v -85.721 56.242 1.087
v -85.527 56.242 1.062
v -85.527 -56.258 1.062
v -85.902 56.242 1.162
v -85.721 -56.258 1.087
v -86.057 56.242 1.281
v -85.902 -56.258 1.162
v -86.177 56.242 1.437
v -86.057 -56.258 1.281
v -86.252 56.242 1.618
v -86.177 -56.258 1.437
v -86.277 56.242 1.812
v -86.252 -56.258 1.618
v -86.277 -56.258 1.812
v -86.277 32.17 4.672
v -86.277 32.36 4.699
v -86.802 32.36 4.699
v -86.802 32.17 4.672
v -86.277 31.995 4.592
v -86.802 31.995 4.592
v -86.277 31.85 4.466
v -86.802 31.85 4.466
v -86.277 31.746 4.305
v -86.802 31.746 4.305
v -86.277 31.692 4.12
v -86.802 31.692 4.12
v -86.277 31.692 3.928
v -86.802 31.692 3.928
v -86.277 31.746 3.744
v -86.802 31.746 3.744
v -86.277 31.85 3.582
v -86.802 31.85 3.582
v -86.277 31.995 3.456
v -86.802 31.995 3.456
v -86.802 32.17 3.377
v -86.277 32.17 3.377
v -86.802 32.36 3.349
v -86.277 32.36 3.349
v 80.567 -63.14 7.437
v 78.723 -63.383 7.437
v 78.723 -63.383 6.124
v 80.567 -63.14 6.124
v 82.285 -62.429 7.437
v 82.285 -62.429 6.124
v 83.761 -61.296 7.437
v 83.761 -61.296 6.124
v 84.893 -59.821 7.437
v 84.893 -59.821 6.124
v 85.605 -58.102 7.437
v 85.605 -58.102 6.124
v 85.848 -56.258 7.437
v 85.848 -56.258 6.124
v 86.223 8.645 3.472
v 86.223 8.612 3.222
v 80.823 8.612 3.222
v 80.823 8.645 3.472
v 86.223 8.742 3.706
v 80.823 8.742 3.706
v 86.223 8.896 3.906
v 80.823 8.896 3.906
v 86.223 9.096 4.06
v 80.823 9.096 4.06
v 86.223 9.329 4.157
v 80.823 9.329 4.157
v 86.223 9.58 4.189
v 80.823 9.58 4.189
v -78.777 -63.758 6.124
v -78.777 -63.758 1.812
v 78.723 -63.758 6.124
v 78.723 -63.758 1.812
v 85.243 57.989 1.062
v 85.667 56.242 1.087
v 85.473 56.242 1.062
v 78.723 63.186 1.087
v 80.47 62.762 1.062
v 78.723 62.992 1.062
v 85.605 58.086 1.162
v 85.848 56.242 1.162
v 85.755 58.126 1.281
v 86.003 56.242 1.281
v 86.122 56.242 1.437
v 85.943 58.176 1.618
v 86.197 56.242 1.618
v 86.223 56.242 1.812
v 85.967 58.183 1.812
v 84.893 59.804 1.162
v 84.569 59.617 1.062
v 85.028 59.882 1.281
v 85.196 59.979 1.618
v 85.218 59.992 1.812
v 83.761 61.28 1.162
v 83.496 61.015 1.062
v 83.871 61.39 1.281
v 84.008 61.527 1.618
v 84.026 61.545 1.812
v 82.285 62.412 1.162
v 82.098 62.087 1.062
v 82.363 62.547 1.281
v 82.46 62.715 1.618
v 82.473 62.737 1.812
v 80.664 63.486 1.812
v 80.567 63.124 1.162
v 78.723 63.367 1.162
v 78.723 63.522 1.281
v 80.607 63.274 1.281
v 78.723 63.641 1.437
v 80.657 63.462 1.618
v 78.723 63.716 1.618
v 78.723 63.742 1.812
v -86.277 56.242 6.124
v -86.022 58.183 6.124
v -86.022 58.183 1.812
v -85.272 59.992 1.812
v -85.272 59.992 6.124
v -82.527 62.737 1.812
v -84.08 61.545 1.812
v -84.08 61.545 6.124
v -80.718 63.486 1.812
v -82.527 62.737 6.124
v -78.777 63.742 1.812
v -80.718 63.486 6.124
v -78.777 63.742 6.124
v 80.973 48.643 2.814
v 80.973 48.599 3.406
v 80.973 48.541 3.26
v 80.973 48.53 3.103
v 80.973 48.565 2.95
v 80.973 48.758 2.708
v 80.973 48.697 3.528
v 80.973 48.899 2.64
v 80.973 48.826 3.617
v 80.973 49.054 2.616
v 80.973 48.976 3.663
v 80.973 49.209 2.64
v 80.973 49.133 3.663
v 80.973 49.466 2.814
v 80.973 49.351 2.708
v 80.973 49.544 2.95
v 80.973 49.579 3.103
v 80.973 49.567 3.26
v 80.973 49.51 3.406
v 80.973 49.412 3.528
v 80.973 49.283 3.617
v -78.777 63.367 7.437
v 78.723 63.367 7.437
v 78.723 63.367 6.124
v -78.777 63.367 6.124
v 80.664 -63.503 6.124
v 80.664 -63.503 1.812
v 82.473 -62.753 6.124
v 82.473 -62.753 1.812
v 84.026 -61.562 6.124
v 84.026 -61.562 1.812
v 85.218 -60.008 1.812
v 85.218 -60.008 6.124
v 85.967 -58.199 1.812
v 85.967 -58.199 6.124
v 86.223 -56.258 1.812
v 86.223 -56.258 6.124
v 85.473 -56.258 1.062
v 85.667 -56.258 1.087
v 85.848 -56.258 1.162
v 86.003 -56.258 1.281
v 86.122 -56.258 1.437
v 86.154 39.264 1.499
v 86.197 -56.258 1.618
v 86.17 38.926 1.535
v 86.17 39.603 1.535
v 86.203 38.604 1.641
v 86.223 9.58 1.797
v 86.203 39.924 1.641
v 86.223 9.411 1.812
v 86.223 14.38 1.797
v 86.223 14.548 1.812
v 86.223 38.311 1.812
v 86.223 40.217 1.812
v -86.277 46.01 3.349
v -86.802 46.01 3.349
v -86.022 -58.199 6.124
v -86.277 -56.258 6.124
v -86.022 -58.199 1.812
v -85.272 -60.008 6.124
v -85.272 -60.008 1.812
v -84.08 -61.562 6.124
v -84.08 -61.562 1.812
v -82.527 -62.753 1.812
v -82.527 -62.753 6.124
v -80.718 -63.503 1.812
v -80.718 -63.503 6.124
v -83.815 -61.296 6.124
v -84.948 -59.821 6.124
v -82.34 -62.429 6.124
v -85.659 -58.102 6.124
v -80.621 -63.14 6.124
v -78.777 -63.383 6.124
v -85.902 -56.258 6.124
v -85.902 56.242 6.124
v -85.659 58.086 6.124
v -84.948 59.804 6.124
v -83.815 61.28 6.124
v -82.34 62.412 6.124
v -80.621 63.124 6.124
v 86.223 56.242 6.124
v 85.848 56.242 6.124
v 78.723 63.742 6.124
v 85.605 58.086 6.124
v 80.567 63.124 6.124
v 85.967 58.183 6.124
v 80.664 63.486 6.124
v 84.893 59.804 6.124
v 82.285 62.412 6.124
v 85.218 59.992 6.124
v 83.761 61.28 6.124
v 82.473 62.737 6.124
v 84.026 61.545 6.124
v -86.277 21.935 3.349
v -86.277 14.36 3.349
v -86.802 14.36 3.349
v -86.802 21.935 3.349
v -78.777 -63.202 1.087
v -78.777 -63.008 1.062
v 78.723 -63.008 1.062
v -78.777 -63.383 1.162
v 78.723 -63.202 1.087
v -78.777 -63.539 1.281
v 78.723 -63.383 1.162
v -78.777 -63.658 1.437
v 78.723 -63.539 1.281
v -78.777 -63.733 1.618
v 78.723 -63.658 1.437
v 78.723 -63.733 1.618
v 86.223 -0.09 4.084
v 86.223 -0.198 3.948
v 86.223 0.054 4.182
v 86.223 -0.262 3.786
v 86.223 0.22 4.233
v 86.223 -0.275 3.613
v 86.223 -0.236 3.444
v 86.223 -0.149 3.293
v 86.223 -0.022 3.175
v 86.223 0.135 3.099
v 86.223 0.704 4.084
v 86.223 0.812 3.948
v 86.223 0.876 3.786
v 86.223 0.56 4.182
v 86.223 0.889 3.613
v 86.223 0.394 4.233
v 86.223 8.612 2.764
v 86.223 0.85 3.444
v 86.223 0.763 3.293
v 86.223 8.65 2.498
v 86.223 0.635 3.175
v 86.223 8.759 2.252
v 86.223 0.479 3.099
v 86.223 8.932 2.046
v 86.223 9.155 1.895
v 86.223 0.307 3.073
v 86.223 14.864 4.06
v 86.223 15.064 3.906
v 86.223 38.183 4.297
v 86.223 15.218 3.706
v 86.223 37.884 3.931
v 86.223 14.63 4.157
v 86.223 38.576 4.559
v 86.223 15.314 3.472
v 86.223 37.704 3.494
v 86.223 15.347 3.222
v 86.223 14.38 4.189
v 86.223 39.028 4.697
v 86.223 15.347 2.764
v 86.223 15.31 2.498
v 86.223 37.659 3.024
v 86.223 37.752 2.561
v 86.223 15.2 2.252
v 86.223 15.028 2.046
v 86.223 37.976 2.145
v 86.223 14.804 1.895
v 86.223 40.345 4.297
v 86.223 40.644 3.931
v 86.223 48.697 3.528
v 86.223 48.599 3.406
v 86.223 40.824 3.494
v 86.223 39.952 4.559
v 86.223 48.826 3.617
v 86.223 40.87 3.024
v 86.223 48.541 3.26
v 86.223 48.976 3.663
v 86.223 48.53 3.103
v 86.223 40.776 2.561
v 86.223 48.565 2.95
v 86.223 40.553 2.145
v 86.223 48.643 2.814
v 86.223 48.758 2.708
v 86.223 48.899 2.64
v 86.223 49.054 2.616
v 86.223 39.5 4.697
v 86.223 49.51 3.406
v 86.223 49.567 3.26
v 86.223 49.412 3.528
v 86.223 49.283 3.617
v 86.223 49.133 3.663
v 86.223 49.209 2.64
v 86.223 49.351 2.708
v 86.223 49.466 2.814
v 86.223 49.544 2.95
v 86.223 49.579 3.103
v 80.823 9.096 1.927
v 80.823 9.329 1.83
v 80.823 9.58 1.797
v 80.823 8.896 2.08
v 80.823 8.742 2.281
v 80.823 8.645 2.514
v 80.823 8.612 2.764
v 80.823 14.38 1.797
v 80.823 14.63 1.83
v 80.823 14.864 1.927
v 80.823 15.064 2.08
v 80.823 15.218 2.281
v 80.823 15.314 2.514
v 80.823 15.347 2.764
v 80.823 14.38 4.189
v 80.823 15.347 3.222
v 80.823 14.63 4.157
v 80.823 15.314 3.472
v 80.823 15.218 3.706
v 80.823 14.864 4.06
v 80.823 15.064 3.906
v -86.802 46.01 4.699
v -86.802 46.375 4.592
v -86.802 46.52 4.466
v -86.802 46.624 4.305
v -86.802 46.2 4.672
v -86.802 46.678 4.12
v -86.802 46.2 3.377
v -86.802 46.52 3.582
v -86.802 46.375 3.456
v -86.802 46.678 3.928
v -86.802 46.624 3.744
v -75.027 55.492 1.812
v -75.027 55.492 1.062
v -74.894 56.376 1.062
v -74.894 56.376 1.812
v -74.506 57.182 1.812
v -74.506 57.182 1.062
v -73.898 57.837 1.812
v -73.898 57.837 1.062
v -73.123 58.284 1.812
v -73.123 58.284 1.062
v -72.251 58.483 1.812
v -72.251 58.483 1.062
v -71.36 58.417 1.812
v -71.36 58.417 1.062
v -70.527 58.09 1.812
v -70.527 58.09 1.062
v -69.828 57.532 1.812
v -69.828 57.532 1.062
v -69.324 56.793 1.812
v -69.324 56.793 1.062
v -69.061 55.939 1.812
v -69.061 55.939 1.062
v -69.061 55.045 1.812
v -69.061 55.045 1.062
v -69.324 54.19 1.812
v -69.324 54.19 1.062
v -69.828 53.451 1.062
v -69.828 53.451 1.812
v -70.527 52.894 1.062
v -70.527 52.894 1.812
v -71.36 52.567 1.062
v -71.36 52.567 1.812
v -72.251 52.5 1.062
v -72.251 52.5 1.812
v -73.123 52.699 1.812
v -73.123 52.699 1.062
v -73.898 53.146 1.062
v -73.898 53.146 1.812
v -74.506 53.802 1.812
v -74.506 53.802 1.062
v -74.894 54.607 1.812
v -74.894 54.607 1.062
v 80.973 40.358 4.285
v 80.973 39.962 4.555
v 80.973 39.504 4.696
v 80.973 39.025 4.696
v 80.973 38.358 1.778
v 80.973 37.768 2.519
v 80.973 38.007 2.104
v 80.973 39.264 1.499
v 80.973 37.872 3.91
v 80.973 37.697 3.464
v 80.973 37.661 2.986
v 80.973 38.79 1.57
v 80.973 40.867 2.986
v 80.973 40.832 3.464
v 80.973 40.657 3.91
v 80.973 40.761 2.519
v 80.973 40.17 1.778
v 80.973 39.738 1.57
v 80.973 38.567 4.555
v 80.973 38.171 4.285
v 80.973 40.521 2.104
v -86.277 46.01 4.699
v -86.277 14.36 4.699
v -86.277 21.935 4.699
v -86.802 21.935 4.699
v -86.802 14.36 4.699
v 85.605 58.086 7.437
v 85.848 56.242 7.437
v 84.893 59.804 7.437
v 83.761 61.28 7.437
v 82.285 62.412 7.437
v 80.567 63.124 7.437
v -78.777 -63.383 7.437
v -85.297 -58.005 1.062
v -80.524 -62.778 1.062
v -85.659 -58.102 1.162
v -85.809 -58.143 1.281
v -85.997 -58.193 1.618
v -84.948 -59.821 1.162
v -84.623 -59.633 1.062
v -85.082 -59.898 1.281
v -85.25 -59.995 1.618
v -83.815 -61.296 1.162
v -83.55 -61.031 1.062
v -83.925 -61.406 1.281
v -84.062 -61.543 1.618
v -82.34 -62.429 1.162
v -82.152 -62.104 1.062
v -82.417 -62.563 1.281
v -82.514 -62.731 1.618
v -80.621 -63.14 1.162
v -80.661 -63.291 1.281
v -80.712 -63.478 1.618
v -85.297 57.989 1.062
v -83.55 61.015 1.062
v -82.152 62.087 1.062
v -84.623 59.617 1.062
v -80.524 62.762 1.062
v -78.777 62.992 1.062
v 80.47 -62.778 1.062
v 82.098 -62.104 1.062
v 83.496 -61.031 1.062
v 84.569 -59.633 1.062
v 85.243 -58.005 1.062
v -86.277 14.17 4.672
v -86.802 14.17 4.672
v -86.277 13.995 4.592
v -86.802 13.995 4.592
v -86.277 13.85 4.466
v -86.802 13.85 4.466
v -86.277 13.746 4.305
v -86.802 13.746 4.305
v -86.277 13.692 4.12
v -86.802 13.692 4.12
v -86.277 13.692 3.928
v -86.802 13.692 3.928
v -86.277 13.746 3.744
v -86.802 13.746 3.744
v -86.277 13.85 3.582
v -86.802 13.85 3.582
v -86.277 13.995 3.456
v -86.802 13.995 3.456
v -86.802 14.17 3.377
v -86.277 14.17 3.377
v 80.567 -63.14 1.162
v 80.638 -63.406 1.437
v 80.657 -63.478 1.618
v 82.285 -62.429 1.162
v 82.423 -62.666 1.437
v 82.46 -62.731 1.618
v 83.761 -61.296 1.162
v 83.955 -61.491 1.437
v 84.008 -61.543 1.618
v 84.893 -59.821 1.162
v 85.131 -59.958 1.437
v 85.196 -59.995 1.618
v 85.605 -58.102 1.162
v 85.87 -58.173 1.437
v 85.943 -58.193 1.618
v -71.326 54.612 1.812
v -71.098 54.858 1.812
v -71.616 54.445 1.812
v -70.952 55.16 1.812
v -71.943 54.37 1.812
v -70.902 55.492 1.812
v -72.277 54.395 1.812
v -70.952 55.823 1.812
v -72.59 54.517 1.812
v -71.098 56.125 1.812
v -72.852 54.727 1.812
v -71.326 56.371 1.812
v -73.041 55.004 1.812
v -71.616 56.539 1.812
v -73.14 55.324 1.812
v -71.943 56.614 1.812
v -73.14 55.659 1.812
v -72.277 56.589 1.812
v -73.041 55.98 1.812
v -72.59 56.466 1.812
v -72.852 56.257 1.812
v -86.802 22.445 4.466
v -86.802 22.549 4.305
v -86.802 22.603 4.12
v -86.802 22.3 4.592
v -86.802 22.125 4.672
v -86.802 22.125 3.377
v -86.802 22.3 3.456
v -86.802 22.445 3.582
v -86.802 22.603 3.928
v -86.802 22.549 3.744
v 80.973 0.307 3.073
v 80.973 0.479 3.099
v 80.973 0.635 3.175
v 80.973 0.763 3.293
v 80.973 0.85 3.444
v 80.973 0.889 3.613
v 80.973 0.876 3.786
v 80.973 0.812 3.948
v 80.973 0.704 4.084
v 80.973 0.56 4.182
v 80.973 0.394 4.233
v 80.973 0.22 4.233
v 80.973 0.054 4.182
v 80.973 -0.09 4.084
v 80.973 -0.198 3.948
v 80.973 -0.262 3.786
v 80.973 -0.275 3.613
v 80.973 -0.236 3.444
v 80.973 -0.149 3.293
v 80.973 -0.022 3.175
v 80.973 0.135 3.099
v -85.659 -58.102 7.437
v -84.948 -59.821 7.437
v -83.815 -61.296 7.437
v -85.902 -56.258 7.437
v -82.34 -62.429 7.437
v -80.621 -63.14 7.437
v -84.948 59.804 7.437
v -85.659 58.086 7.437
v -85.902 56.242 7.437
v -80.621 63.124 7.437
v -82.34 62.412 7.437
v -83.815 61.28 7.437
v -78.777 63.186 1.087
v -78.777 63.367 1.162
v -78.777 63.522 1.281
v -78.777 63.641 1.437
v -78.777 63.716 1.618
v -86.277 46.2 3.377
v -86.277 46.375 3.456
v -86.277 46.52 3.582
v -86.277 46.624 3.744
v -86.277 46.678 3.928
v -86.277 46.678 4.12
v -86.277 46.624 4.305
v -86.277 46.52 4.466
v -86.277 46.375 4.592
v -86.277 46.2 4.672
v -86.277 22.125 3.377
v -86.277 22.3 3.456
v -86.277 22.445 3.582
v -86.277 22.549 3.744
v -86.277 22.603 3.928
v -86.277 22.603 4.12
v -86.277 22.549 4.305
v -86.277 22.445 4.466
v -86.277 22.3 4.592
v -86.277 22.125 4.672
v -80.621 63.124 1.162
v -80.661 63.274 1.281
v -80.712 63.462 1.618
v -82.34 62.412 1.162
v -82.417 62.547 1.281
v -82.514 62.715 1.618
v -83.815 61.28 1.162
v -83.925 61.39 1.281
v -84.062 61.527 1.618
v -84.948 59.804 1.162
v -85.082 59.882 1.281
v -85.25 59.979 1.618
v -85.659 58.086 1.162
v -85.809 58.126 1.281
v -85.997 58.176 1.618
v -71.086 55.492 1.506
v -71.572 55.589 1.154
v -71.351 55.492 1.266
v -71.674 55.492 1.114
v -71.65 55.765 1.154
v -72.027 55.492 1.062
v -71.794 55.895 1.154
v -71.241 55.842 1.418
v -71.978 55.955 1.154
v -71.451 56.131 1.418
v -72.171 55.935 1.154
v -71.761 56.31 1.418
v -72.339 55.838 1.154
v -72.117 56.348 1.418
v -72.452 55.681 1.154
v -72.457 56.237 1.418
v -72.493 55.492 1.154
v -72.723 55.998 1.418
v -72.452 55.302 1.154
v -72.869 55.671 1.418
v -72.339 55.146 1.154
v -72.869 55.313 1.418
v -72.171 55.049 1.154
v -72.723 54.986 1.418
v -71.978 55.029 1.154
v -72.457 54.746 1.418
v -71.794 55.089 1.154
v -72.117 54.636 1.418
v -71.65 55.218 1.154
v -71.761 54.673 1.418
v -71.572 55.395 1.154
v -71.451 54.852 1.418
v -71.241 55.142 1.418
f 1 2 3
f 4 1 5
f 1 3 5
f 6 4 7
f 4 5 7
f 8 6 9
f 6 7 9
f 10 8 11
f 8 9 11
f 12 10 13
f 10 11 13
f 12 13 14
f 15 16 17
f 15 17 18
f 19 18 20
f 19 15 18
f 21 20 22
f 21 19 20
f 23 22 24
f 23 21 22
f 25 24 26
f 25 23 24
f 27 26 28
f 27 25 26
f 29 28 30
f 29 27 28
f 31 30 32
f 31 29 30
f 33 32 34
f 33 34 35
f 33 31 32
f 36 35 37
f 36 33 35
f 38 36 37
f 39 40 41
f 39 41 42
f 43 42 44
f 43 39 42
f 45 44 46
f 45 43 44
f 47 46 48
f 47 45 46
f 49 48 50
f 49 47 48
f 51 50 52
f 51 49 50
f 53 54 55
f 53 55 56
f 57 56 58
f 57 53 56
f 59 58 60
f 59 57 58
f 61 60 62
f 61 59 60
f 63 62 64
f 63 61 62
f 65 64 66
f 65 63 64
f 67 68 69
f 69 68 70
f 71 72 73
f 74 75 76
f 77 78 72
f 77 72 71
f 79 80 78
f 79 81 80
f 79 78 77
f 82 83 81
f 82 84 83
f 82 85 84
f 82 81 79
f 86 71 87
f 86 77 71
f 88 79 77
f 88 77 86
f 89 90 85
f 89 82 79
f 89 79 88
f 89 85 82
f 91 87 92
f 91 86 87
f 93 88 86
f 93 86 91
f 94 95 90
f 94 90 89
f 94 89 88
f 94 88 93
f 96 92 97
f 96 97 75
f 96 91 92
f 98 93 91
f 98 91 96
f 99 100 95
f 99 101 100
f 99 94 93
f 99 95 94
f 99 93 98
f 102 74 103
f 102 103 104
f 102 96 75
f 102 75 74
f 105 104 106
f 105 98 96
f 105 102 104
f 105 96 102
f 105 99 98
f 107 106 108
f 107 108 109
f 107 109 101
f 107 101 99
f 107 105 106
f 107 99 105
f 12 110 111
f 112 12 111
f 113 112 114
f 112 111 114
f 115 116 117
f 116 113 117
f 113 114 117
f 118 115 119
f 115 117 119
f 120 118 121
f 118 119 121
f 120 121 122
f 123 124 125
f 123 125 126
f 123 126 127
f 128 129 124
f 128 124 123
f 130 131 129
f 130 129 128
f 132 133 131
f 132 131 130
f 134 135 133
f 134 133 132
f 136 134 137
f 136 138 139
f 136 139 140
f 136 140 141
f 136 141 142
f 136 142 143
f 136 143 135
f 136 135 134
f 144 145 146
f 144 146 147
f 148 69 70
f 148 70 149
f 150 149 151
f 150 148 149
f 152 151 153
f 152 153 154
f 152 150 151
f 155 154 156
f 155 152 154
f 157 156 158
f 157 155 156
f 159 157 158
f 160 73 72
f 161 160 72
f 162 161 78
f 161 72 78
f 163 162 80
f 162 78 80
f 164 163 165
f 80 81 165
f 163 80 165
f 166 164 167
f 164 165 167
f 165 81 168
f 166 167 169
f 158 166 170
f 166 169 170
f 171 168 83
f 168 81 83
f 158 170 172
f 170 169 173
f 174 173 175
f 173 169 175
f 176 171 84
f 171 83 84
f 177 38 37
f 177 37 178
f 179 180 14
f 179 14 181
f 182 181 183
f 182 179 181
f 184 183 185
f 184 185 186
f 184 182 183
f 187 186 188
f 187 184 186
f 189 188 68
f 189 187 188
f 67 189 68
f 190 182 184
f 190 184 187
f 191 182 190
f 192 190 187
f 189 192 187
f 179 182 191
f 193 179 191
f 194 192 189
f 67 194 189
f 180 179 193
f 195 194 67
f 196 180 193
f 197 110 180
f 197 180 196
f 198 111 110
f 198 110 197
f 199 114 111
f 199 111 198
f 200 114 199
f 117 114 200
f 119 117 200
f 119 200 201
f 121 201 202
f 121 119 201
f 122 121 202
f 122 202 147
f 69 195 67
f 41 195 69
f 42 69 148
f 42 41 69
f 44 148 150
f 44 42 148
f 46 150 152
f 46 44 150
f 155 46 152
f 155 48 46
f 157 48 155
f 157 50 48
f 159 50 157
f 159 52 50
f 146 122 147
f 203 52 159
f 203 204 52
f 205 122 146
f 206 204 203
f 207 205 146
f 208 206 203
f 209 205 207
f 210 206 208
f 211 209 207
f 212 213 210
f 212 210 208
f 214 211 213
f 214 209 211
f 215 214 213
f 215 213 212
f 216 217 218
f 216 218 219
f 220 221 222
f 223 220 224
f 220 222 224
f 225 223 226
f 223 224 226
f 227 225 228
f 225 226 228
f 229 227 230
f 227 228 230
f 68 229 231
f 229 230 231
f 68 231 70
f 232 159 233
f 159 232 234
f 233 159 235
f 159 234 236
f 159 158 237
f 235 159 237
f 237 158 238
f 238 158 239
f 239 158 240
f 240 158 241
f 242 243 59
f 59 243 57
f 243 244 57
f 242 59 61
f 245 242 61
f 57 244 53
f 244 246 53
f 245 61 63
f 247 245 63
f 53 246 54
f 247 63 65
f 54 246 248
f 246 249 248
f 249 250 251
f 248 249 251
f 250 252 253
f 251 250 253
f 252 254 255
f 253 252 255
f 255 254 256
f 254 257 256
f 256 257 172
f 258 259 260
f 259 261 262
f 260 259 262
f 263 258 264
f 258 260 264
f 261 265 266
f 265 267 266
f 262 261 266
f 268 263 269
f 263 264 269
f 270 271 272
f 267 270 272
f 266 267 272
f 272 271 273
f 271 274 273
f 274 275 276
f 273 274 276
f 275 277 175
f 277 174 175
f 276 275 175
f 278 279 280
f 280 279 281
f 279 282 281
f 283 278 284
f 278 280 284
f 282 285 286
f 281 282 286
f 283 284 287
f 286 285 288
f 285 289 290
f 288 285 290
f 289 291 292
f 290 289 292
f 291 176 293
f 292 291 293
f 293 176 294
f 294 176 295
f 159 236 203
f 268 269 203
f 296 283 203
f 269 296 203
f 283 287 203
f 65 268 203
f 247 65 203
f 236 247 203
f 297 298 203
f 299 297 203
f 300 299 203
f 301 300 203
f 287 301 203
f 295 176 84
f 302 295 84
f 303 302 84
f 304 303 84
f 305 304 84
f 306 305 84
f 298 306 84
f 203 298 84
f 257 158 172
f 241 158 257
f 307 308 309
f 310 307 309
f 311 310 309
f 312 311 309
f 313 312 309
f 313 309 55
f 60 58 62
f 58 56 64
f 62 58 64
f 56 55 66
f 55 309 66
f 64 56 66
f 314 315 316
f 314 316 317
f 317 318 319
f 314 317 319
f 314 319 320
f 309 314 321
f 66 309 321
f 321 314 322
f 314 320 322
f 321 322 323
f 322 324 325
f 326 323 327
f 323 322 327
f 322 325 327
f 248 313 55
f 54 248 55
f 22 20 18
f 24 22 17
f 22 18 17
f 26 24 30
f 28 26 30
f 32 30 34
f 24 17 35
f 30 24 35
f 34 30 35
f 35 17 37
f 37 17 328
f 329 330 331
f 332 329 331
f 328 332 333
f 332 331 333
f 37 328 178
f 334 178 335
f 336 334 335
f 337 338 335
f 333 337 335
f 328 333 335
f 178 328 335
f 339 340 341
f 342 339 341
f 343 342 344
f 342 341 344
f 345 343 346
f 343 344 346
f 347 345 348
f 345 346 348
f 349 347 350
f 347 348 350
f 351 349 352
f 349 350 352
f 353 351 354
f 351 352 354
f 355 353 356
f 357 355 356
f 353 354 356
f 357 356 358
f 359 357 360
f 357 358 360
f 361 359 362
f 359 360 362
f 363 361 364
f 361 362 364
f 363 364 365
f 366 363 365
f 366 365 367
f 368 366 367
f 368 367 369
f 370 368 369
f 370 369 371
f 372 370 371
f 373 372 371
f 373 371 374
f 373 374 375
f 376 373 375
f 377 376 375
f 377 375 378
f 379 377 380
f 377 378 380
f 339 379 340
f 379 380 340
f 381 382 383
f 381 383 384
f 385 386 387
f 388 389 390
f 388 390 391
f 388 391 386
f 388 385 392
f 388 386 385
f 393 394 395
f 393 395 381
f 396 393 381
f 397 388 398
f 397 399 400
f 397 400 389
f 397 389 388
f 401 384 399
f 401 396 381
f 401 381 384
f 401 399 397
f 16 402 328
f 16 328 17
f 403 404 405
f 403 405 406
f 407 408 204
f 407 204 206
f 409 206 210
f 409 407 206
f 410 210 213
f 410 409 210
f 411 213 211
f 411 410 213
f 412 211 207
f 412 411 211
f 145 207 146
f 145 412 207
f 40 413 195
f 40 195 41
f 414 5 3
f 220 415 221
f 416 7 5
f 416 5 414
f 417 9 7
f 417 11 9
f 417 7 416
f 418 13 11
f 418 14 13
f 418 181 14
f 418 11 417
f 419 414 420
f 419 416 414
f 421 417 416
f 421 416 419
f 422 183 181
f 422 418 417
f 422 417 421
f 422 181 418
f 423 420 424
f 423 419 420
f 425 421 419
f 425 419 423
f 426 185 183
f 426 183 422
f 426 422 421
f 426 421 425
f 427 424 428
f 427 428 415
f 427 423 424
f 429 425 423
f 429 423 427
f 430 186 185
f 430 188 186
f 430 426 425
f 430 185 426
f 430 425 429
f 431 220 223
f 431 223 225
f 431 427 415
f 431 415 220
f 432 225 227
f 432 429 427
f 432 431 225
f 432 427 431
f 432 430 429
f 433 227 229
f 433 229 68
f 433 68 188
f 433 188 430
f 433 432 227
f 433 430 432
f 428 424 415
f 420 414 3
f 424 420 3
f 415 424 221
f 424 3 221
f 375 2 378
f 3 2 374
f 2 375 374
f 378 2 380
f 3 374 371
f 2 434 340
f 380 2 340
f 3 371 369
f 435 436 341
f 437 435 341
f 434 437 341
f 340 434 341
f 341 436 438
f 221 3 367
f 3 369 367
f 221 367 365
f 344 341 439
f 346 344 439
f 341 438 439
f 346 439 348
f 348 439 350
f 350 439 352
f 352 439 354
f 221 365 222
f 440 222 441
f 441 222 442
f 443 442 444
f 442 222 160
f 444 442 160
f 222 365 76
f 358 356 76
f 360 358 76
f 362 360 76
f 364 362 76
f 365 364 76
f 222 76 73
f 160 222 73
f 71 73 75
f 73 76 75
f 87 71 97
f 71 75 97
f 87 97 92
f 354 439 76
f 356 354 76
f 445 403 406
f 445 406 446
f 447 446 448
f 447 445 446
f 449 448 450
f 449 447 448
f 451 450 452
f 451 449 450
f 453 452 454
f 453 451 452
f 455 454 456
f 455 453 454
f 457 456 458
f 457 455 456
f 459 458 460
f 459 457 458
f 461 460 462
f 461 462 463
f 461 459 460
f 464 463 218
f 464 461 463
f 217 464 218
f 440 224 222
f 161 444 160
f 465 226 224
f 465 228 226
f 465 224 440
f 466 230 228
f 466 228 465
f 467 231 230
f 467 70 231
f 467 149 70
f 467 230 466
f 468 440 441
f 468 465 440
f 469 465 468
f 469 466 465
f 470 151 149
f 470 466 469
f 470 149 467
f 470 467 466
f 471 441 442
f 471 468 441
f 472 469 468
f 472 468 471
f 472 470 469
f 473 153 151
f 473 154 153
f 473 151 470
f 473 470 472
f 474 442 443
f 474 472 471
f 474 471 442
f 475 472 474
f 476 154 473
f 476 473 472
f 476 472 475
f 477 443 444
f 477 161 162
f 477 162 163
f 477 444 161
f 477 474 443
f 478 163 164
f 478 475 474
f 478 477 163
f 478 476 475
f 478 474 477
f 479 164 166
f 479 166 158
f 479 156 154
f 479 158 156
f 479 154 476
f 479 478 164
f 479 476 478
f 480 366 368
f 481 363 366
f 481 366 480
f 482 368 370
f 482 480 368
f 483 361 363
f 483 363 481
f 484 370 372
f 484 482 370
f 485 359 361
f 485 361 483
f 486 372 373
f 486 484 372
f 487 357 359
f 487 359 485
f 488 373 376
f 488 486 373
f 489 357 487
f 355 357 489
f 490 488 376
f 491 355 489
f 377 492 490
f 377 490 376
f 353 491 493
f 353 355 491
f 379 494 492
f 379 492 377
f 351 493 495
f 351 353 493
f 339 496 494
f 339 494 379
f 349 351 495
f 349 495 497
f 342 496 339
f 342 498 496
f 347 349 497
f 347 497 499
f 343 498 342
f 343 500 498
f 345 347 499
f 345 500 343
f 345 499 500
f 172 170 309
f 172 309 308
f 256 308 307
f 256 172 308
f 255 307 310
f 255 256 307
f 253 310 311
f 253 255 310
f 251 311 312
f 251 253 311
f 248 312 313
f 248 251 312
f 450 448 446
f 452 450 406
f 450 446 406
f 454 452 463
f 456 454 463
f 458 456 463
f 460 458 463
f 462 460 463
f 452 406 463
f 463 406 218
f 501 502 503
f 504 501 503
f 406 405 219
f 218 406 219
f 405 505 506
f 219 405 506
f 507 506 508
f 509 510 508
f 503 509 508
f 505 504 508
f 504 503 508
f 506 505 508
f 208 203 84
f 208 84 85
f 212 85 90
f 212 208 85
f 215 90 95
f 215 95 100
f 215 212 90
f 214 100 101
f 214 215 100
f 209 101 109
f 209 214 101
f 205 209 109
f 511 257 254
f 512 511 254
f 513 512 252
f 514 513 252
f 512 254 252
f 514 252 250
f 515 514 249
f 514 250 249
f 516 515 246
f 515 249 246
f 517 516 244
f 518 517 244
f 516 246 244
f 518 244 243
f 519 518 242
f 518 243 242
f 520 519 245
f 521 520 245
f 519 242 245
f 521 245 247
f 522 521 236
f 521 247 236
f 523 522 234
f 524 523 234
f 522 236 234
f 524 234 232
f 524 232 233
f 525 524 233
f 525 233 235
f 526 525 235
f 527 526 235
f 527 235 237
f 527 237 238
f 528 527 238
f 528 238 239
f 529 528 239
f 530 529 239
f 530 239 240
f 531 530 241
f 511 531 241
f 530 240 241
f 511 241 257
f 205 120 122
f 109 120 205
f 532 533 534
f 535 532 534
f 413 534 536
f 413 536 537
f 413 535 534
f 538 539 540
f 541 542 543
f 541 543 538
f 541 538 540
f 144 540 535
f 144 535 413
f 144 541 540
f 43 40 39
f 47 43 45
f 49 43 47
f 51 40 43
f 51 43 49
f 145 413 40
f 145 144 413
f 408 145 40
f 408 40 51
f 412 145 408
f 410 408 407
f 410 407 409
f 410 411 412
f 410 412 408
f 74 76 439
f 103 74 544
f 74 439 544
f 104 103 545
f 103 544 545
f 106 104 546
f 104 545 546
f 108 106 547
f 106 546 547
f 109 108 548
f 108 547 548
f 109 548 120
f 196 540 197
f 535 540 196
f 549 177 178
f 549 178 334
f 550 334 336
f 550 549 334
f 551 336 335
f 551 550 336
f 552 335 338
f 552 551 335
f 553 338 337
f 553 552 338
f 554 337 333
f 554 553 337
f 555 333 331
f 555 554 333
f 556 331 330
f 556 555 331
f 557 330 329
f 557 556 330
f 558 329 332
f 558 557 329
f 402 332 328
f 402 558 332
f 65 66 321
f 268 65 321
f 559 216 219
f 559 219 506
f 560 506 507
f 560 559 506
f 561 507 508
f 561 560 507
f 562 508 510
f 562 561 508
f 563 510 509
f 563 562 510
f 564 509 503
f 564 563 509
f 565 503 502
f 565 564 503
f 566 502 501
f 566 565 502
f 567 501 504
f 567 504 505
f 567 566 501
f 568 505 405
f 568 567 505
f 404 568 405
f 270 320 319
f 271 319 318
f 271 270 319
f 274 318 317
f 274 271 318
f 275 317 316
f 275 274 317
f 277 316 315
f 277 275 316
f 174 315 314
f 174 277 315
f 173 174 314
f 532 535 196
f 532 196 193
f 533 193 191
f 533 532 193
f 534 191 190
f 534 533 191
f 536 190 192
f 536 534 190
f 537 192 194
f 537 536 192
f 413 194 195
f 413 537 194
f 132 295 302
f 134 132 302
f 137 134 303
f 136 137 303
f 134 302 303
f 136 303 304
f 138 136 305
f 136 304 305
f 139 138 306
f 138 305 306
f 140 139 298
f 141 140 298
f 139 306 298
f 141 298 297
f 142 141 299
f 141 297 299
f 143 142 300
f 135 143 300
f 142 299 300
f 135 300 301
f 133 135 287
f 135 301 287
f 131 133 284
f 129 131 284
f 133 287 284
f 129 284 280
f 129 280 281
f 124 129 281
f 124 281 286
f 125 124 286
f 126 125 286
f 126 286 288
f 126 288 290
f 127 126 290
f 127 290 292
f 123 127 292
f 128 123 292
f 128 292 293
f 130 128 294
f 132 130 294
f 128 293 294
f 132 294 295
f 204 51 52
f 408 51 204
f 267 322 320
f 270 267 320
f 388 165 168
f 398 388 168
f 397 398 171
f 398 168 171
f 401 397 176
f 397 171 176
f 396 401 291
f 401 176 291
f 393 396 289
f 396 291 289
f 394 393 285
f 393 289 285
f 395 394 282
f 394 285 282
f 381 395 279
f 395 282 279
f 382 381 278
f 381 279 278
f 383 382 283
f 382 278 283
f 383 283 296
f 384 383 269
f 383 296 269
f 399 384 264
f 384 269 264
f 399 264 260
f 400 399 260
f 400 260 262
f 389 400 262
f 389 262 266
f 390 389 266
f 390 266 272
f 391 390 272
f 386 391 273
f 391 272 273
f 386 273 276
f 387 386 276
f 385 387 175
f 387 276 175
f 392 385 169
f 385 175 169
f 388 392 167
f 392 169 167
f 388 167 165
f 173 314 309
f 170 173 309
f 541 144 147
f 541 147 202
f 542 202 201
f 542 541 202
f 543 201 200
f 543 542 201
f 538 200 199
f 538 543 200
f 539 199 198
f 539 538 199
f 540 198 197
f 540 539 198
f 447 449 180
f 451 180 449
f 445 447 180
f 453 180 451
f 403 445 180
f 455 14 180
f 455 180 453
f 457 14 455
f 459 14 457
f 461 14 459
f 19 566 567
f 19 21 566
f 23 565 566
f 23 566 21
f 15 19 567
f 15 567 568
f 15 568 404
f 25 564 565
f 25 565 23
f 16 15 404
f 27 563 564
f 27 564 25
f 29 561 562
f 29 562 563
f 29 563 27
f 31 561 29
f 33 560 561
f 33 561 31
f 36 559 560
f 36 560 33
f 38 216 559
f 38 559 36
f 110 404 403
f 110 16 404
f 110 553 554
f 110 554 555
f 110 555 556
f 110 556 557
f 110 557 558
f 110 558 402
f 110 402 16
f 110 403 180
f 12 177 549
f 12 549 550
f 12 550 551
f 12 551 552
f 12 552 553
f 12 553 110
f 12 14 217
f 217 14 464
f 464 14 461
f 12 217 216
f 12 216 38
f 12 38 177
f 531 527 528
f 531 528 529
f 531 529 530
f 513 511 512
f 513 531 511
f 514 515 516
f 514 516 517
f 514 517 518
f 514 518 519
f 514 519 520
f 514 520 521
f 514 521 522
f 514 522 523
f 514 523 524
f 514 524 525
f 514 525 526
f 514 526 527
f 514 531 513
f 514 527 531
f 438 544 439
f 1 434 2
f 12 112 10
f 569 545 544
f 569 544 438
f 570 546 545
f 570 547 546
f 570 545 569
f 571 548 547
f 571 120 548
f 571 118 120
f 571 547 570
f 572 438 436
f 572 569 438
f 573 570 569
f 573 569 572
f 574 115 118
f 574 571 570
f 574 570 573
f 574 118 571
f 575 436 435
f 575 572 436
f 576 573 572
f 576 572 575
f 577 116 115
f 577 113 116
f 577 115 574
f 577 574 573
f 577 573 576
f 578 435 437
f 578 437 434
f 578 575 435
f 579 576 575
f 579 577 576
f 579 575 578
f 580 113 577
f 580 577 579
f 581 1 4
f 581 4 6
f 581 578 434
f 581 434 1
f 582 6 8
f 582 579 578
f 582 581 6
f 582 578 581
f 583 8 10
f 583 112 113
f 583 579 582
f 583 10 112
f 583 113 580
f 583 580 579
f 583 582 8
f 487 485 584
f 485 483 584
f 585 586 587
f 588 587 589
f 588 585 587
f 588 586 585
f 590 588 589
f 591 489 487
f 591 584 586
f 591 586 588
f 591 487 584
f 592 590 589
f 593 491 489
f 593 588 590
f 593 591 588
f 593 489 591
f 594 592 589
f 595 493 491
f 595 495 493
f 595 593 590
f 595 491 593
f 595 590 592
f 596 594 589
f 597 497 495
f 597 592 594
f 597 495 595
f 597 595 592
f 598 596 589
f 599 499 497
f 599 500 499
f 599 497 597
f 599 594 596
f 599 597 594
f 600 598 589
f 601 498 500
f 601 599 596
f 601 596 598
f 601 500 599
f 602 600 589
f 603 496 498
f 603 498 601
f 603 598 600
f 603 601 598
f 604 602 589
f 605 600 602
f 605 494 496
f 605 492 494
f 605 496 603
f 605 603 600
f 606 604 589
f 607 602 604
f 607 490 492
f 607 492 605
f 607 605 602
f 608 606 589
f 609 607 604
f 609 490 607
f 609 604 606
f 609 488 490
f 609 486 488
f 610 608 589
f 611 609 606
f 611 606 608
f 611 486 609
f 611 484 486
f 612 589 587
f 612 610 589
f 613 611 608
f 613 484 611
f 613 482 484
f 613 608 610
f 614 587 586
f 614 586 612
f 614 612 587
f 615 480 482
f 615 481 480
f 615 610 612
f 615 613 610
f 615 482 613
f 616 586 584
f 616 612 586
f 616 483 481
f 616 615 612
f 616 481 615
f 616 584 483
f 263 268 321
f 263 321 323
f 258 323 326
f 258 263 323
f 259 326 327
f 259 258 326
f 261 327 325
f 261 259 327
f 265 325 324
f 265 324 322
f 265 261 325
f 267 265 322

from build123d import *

# Parameters (mm, degrees)
SKETCH1_W           = 230
SKETCH1_H           = 170
BOSS_EXTRUDE1_DEPTH = 8.5
FILLET1_R           = 10
FILLET2_R           = 1
CUT_EXTRUDE1_DEPTH  = 7.2
SKETCH9_R           = 2.143665007
SKETCH9_R_2         = 0.701539988
SKETCH9_R_3         = 0.777758638
CUT_EXTRUDE2_DEPTH  = 7
CUT_EXTRUDE3_DEPTH  = 1.75
BOSS_EXTRUDE2_DEPTH = 0.7
SKETCH16_R          = 4
CUT_EXTRUDE4_DEPTH  = 1
SCALE2_SCALE        = 0.75


# Read off the part's stored shape, not the designer's step: Dome1
with BuildPart() as part:
    # Sketch1 → Boss-Extrude1 (new body)
    with BuildSketch(Plane.XY):
        Rectangle(SKETCH1_W, SKETCH1_H)
    extrude(amount=BOSS_EXTRUDE1_DEPTH)

    # Fillet1
    fillet1_edges = [part.edges().sort_by_distance(p)[0] for p in [
        (115, -85, 4.25),
        (-115, -85, 4.25),
        (-115, 85, 4.25),
        (115, 85, 4.25),
    ]]
    fillet(fillet1_edges, radius=FILLET1_R)

    # Fillet2
    fillet2_edges = [part.edges().sort_by_distance(p)[0] for p in [
        (115, 0, 0),
        (0, -85, 0),
        (-115, 0, 0),
        (0, 85, 0),
        (-112.071067812, 82.071067812, 0),
        (112.071067812, 82.071067812, 0),
        (-112.071067812, -82.071067812, 0),
        (112.071067812, -82.071067812, 0),
    ]]
    fillet(fillet2_edges, radius=FILLET2_R)

    # Sketch8 → Cut-Extrude1 (cut)
    with BuildSketch(Plane(origin=(115, 0, 0), x_dir=(0, 0, -1), z_dir=(1, 0, 0))):
        with BuildLine():
            Line((-0.980286153, 19.184203106), (-0.980286153, 12.784203106))
            ThreePointArc((-0.980286153, 12.784203106), (-1.358118405, 11.872035358), (-2.270286153, 11.494203106))
            Line((-2.270286153, 11.494203106), (-2.880286153, 11.494203106))
            ThreePointArc((-2.880286153, 11.494203106), (-3.7924539, 11.872035358), (-4.170286153, 12.784203106))
            Line((-4.170286153, 12.784203106), (-4.170286153, 19.184203106))
            ThreePointArc((-4.170286153, 19.184203106), (-3.7924539, 20.096370853), (-2.880286153, 20.474203106))
            Line((-2.880286153, 20.474203106), (-2.270286153, 20.474203106))
            ThreePointArc((-2.270286153, 20.474203106), (-1.358118405, 20.096370853), (-0.980286153, 19.184203106))
        make_face()
    extrude(amount=-CUT_EXTRUDE1_DEPTH, mode=Mode.SUBTRACT)

    # Sketch9 → Cut-Extrude2 (cut)
    with BuildSketch(Plane(origin=(115, 0, 0), x_dir=(0, 0, -1), z_dir=(1, 0, 0))):
        with Locations((-2.726268546, 52.363224928)):
            Circle(SKETCH9_R)
        with Locations((-2.774318312, 65.416854758)):
            Circle(SKETCH9_R_2)
        with Locations((-3.459851421, 0.420212385)):
            Circle(SKETCH9_R_3)
    extrude(amount=-CUT_EXTRUDE2_DEPTH, mode=Mode.SUBTRACT)

    # Sketch11 → Cut-Extrude3 (cut)
    with BuildSketch(Plane.XY.offset(8.5)):
        with BuildLine():
            Line((-105, -85), (105, -85))
            ThreePointArc((105, -85), (112.071067812, -82.071067812), (115, -75))
            Line((115, -75), (115, 75))
            ThreePointArc((115, 75), (112.071067812, 82.071067812), (105, 85))
            Line((105, 85), (-105, 85))
            ThreePointArc((-105, 85), (-112.071067812, 82.071067812), (-115, 75))
            Line((-115, 75), (-115, -75))
            ThreePointArc((-115, -75), (-112.071067812, -82.071067812), (-105, -85))
        make_face()
        with BuildLine():
            Line((-105, -84.5), (105, -84.5))
            ThreePointArc((105, -84.5), (111.717514421, -81.717514421), (114.5, -75))
            Line((114.5, -75), (114.5, 75))
            ThreePointArc((114.5, 75), (111.717514421, 81.717514421), (105, 84.5))
            Line((105, 84.5), (-105, 84.5))
            ThreePointArc((-105, 84.5), (-111.717514421, 81.717514421), (-114.5, 75))
            Line((-114.5, 75), (-114.5, -75))
            ThreePointArc((-114.5, -75), (-111.717514421, -81.717514421), (-105, -84.5))
        make_face(mode=Mode.SUBTRACT)
    extrude(amount=-CUT_EXTRUDE3_DEPTH, mode=Mode.SUBTRACT)

    # Sketch13<3> → Boss-Extrude2 (add)
    with BuildSketch(Plane.ZY.offset(115)):
        with BuildLine():
            Line((4.85, 29.258026972), (4.85, 19.158026972))
            ThreePointArc((4.85, 19.158026972), (3.95, 18.258026972), (3.05, 19.158026972))
            Line((3.05, 19.158026972), (3.05, 29.258026972))
            ThreePointArc((3.05, 29.258026972), (3.95, 30.158026972), (4.85, 29.258026972))
        make_face()
        with BuildLine():
            Line((4.85, 61.358026972), (4.85, 43.158026972))
            ThreePointArc((4.85, 43.158026972), (3.95, 42.258026972), (3.05, 43.158026972))
            Line((3.05, 43.158026972), (3.05, 61.358026972))
            ThreePointArc((3.05, 61.358026972), (3.95, 62.258026972), (4.85, 61.358026972))
        make_face()
    extrude(amount=BOSS_EXTRUDE2_DEPTH)

    # Sketch16 → Cut-Extrude4 (cut)
    with BuildSketch(Plane(origin=(0, 0, 0), x_dir=(-1, 0, 0), z_dir=(0, 0, -1))):
        with Locations((96, 74)):
            Circle(SKETCH16_R)
    extrude(amount=-CUT_EXTRUDE4_DEPTH, mode=Mode.SUBTRACT)

    # Dome1 outline → Dome1 (revolve)
    with BuildSketch(Plane(origin=(-96, 74, 0), x_dir=(1, 0, 0), z_dir=(0, -1, 0))):
        with BuildLine():
            Line((0, 1.000000002), (0, 0))
            ThreePointArc((0, 0), (0.90138782, 0.272918272), (1.500000001, 1.000000002))
            Line((1.500000001, 1.000000002), (0, 1.000000002))
        make_face()
    revolve(axis=Axis((-96, 74, 0), (0, 0, 1)))


with BuildPart() as part_1:
    # Scale2: scaled about (-0.108567149, -0.033027208, 4.247091052)
    add(part.part.scale(SCALE2_SCALE).moved(Location((-0.027141787, -0.008256802, 1.061772763))))


solid = part_1.part
